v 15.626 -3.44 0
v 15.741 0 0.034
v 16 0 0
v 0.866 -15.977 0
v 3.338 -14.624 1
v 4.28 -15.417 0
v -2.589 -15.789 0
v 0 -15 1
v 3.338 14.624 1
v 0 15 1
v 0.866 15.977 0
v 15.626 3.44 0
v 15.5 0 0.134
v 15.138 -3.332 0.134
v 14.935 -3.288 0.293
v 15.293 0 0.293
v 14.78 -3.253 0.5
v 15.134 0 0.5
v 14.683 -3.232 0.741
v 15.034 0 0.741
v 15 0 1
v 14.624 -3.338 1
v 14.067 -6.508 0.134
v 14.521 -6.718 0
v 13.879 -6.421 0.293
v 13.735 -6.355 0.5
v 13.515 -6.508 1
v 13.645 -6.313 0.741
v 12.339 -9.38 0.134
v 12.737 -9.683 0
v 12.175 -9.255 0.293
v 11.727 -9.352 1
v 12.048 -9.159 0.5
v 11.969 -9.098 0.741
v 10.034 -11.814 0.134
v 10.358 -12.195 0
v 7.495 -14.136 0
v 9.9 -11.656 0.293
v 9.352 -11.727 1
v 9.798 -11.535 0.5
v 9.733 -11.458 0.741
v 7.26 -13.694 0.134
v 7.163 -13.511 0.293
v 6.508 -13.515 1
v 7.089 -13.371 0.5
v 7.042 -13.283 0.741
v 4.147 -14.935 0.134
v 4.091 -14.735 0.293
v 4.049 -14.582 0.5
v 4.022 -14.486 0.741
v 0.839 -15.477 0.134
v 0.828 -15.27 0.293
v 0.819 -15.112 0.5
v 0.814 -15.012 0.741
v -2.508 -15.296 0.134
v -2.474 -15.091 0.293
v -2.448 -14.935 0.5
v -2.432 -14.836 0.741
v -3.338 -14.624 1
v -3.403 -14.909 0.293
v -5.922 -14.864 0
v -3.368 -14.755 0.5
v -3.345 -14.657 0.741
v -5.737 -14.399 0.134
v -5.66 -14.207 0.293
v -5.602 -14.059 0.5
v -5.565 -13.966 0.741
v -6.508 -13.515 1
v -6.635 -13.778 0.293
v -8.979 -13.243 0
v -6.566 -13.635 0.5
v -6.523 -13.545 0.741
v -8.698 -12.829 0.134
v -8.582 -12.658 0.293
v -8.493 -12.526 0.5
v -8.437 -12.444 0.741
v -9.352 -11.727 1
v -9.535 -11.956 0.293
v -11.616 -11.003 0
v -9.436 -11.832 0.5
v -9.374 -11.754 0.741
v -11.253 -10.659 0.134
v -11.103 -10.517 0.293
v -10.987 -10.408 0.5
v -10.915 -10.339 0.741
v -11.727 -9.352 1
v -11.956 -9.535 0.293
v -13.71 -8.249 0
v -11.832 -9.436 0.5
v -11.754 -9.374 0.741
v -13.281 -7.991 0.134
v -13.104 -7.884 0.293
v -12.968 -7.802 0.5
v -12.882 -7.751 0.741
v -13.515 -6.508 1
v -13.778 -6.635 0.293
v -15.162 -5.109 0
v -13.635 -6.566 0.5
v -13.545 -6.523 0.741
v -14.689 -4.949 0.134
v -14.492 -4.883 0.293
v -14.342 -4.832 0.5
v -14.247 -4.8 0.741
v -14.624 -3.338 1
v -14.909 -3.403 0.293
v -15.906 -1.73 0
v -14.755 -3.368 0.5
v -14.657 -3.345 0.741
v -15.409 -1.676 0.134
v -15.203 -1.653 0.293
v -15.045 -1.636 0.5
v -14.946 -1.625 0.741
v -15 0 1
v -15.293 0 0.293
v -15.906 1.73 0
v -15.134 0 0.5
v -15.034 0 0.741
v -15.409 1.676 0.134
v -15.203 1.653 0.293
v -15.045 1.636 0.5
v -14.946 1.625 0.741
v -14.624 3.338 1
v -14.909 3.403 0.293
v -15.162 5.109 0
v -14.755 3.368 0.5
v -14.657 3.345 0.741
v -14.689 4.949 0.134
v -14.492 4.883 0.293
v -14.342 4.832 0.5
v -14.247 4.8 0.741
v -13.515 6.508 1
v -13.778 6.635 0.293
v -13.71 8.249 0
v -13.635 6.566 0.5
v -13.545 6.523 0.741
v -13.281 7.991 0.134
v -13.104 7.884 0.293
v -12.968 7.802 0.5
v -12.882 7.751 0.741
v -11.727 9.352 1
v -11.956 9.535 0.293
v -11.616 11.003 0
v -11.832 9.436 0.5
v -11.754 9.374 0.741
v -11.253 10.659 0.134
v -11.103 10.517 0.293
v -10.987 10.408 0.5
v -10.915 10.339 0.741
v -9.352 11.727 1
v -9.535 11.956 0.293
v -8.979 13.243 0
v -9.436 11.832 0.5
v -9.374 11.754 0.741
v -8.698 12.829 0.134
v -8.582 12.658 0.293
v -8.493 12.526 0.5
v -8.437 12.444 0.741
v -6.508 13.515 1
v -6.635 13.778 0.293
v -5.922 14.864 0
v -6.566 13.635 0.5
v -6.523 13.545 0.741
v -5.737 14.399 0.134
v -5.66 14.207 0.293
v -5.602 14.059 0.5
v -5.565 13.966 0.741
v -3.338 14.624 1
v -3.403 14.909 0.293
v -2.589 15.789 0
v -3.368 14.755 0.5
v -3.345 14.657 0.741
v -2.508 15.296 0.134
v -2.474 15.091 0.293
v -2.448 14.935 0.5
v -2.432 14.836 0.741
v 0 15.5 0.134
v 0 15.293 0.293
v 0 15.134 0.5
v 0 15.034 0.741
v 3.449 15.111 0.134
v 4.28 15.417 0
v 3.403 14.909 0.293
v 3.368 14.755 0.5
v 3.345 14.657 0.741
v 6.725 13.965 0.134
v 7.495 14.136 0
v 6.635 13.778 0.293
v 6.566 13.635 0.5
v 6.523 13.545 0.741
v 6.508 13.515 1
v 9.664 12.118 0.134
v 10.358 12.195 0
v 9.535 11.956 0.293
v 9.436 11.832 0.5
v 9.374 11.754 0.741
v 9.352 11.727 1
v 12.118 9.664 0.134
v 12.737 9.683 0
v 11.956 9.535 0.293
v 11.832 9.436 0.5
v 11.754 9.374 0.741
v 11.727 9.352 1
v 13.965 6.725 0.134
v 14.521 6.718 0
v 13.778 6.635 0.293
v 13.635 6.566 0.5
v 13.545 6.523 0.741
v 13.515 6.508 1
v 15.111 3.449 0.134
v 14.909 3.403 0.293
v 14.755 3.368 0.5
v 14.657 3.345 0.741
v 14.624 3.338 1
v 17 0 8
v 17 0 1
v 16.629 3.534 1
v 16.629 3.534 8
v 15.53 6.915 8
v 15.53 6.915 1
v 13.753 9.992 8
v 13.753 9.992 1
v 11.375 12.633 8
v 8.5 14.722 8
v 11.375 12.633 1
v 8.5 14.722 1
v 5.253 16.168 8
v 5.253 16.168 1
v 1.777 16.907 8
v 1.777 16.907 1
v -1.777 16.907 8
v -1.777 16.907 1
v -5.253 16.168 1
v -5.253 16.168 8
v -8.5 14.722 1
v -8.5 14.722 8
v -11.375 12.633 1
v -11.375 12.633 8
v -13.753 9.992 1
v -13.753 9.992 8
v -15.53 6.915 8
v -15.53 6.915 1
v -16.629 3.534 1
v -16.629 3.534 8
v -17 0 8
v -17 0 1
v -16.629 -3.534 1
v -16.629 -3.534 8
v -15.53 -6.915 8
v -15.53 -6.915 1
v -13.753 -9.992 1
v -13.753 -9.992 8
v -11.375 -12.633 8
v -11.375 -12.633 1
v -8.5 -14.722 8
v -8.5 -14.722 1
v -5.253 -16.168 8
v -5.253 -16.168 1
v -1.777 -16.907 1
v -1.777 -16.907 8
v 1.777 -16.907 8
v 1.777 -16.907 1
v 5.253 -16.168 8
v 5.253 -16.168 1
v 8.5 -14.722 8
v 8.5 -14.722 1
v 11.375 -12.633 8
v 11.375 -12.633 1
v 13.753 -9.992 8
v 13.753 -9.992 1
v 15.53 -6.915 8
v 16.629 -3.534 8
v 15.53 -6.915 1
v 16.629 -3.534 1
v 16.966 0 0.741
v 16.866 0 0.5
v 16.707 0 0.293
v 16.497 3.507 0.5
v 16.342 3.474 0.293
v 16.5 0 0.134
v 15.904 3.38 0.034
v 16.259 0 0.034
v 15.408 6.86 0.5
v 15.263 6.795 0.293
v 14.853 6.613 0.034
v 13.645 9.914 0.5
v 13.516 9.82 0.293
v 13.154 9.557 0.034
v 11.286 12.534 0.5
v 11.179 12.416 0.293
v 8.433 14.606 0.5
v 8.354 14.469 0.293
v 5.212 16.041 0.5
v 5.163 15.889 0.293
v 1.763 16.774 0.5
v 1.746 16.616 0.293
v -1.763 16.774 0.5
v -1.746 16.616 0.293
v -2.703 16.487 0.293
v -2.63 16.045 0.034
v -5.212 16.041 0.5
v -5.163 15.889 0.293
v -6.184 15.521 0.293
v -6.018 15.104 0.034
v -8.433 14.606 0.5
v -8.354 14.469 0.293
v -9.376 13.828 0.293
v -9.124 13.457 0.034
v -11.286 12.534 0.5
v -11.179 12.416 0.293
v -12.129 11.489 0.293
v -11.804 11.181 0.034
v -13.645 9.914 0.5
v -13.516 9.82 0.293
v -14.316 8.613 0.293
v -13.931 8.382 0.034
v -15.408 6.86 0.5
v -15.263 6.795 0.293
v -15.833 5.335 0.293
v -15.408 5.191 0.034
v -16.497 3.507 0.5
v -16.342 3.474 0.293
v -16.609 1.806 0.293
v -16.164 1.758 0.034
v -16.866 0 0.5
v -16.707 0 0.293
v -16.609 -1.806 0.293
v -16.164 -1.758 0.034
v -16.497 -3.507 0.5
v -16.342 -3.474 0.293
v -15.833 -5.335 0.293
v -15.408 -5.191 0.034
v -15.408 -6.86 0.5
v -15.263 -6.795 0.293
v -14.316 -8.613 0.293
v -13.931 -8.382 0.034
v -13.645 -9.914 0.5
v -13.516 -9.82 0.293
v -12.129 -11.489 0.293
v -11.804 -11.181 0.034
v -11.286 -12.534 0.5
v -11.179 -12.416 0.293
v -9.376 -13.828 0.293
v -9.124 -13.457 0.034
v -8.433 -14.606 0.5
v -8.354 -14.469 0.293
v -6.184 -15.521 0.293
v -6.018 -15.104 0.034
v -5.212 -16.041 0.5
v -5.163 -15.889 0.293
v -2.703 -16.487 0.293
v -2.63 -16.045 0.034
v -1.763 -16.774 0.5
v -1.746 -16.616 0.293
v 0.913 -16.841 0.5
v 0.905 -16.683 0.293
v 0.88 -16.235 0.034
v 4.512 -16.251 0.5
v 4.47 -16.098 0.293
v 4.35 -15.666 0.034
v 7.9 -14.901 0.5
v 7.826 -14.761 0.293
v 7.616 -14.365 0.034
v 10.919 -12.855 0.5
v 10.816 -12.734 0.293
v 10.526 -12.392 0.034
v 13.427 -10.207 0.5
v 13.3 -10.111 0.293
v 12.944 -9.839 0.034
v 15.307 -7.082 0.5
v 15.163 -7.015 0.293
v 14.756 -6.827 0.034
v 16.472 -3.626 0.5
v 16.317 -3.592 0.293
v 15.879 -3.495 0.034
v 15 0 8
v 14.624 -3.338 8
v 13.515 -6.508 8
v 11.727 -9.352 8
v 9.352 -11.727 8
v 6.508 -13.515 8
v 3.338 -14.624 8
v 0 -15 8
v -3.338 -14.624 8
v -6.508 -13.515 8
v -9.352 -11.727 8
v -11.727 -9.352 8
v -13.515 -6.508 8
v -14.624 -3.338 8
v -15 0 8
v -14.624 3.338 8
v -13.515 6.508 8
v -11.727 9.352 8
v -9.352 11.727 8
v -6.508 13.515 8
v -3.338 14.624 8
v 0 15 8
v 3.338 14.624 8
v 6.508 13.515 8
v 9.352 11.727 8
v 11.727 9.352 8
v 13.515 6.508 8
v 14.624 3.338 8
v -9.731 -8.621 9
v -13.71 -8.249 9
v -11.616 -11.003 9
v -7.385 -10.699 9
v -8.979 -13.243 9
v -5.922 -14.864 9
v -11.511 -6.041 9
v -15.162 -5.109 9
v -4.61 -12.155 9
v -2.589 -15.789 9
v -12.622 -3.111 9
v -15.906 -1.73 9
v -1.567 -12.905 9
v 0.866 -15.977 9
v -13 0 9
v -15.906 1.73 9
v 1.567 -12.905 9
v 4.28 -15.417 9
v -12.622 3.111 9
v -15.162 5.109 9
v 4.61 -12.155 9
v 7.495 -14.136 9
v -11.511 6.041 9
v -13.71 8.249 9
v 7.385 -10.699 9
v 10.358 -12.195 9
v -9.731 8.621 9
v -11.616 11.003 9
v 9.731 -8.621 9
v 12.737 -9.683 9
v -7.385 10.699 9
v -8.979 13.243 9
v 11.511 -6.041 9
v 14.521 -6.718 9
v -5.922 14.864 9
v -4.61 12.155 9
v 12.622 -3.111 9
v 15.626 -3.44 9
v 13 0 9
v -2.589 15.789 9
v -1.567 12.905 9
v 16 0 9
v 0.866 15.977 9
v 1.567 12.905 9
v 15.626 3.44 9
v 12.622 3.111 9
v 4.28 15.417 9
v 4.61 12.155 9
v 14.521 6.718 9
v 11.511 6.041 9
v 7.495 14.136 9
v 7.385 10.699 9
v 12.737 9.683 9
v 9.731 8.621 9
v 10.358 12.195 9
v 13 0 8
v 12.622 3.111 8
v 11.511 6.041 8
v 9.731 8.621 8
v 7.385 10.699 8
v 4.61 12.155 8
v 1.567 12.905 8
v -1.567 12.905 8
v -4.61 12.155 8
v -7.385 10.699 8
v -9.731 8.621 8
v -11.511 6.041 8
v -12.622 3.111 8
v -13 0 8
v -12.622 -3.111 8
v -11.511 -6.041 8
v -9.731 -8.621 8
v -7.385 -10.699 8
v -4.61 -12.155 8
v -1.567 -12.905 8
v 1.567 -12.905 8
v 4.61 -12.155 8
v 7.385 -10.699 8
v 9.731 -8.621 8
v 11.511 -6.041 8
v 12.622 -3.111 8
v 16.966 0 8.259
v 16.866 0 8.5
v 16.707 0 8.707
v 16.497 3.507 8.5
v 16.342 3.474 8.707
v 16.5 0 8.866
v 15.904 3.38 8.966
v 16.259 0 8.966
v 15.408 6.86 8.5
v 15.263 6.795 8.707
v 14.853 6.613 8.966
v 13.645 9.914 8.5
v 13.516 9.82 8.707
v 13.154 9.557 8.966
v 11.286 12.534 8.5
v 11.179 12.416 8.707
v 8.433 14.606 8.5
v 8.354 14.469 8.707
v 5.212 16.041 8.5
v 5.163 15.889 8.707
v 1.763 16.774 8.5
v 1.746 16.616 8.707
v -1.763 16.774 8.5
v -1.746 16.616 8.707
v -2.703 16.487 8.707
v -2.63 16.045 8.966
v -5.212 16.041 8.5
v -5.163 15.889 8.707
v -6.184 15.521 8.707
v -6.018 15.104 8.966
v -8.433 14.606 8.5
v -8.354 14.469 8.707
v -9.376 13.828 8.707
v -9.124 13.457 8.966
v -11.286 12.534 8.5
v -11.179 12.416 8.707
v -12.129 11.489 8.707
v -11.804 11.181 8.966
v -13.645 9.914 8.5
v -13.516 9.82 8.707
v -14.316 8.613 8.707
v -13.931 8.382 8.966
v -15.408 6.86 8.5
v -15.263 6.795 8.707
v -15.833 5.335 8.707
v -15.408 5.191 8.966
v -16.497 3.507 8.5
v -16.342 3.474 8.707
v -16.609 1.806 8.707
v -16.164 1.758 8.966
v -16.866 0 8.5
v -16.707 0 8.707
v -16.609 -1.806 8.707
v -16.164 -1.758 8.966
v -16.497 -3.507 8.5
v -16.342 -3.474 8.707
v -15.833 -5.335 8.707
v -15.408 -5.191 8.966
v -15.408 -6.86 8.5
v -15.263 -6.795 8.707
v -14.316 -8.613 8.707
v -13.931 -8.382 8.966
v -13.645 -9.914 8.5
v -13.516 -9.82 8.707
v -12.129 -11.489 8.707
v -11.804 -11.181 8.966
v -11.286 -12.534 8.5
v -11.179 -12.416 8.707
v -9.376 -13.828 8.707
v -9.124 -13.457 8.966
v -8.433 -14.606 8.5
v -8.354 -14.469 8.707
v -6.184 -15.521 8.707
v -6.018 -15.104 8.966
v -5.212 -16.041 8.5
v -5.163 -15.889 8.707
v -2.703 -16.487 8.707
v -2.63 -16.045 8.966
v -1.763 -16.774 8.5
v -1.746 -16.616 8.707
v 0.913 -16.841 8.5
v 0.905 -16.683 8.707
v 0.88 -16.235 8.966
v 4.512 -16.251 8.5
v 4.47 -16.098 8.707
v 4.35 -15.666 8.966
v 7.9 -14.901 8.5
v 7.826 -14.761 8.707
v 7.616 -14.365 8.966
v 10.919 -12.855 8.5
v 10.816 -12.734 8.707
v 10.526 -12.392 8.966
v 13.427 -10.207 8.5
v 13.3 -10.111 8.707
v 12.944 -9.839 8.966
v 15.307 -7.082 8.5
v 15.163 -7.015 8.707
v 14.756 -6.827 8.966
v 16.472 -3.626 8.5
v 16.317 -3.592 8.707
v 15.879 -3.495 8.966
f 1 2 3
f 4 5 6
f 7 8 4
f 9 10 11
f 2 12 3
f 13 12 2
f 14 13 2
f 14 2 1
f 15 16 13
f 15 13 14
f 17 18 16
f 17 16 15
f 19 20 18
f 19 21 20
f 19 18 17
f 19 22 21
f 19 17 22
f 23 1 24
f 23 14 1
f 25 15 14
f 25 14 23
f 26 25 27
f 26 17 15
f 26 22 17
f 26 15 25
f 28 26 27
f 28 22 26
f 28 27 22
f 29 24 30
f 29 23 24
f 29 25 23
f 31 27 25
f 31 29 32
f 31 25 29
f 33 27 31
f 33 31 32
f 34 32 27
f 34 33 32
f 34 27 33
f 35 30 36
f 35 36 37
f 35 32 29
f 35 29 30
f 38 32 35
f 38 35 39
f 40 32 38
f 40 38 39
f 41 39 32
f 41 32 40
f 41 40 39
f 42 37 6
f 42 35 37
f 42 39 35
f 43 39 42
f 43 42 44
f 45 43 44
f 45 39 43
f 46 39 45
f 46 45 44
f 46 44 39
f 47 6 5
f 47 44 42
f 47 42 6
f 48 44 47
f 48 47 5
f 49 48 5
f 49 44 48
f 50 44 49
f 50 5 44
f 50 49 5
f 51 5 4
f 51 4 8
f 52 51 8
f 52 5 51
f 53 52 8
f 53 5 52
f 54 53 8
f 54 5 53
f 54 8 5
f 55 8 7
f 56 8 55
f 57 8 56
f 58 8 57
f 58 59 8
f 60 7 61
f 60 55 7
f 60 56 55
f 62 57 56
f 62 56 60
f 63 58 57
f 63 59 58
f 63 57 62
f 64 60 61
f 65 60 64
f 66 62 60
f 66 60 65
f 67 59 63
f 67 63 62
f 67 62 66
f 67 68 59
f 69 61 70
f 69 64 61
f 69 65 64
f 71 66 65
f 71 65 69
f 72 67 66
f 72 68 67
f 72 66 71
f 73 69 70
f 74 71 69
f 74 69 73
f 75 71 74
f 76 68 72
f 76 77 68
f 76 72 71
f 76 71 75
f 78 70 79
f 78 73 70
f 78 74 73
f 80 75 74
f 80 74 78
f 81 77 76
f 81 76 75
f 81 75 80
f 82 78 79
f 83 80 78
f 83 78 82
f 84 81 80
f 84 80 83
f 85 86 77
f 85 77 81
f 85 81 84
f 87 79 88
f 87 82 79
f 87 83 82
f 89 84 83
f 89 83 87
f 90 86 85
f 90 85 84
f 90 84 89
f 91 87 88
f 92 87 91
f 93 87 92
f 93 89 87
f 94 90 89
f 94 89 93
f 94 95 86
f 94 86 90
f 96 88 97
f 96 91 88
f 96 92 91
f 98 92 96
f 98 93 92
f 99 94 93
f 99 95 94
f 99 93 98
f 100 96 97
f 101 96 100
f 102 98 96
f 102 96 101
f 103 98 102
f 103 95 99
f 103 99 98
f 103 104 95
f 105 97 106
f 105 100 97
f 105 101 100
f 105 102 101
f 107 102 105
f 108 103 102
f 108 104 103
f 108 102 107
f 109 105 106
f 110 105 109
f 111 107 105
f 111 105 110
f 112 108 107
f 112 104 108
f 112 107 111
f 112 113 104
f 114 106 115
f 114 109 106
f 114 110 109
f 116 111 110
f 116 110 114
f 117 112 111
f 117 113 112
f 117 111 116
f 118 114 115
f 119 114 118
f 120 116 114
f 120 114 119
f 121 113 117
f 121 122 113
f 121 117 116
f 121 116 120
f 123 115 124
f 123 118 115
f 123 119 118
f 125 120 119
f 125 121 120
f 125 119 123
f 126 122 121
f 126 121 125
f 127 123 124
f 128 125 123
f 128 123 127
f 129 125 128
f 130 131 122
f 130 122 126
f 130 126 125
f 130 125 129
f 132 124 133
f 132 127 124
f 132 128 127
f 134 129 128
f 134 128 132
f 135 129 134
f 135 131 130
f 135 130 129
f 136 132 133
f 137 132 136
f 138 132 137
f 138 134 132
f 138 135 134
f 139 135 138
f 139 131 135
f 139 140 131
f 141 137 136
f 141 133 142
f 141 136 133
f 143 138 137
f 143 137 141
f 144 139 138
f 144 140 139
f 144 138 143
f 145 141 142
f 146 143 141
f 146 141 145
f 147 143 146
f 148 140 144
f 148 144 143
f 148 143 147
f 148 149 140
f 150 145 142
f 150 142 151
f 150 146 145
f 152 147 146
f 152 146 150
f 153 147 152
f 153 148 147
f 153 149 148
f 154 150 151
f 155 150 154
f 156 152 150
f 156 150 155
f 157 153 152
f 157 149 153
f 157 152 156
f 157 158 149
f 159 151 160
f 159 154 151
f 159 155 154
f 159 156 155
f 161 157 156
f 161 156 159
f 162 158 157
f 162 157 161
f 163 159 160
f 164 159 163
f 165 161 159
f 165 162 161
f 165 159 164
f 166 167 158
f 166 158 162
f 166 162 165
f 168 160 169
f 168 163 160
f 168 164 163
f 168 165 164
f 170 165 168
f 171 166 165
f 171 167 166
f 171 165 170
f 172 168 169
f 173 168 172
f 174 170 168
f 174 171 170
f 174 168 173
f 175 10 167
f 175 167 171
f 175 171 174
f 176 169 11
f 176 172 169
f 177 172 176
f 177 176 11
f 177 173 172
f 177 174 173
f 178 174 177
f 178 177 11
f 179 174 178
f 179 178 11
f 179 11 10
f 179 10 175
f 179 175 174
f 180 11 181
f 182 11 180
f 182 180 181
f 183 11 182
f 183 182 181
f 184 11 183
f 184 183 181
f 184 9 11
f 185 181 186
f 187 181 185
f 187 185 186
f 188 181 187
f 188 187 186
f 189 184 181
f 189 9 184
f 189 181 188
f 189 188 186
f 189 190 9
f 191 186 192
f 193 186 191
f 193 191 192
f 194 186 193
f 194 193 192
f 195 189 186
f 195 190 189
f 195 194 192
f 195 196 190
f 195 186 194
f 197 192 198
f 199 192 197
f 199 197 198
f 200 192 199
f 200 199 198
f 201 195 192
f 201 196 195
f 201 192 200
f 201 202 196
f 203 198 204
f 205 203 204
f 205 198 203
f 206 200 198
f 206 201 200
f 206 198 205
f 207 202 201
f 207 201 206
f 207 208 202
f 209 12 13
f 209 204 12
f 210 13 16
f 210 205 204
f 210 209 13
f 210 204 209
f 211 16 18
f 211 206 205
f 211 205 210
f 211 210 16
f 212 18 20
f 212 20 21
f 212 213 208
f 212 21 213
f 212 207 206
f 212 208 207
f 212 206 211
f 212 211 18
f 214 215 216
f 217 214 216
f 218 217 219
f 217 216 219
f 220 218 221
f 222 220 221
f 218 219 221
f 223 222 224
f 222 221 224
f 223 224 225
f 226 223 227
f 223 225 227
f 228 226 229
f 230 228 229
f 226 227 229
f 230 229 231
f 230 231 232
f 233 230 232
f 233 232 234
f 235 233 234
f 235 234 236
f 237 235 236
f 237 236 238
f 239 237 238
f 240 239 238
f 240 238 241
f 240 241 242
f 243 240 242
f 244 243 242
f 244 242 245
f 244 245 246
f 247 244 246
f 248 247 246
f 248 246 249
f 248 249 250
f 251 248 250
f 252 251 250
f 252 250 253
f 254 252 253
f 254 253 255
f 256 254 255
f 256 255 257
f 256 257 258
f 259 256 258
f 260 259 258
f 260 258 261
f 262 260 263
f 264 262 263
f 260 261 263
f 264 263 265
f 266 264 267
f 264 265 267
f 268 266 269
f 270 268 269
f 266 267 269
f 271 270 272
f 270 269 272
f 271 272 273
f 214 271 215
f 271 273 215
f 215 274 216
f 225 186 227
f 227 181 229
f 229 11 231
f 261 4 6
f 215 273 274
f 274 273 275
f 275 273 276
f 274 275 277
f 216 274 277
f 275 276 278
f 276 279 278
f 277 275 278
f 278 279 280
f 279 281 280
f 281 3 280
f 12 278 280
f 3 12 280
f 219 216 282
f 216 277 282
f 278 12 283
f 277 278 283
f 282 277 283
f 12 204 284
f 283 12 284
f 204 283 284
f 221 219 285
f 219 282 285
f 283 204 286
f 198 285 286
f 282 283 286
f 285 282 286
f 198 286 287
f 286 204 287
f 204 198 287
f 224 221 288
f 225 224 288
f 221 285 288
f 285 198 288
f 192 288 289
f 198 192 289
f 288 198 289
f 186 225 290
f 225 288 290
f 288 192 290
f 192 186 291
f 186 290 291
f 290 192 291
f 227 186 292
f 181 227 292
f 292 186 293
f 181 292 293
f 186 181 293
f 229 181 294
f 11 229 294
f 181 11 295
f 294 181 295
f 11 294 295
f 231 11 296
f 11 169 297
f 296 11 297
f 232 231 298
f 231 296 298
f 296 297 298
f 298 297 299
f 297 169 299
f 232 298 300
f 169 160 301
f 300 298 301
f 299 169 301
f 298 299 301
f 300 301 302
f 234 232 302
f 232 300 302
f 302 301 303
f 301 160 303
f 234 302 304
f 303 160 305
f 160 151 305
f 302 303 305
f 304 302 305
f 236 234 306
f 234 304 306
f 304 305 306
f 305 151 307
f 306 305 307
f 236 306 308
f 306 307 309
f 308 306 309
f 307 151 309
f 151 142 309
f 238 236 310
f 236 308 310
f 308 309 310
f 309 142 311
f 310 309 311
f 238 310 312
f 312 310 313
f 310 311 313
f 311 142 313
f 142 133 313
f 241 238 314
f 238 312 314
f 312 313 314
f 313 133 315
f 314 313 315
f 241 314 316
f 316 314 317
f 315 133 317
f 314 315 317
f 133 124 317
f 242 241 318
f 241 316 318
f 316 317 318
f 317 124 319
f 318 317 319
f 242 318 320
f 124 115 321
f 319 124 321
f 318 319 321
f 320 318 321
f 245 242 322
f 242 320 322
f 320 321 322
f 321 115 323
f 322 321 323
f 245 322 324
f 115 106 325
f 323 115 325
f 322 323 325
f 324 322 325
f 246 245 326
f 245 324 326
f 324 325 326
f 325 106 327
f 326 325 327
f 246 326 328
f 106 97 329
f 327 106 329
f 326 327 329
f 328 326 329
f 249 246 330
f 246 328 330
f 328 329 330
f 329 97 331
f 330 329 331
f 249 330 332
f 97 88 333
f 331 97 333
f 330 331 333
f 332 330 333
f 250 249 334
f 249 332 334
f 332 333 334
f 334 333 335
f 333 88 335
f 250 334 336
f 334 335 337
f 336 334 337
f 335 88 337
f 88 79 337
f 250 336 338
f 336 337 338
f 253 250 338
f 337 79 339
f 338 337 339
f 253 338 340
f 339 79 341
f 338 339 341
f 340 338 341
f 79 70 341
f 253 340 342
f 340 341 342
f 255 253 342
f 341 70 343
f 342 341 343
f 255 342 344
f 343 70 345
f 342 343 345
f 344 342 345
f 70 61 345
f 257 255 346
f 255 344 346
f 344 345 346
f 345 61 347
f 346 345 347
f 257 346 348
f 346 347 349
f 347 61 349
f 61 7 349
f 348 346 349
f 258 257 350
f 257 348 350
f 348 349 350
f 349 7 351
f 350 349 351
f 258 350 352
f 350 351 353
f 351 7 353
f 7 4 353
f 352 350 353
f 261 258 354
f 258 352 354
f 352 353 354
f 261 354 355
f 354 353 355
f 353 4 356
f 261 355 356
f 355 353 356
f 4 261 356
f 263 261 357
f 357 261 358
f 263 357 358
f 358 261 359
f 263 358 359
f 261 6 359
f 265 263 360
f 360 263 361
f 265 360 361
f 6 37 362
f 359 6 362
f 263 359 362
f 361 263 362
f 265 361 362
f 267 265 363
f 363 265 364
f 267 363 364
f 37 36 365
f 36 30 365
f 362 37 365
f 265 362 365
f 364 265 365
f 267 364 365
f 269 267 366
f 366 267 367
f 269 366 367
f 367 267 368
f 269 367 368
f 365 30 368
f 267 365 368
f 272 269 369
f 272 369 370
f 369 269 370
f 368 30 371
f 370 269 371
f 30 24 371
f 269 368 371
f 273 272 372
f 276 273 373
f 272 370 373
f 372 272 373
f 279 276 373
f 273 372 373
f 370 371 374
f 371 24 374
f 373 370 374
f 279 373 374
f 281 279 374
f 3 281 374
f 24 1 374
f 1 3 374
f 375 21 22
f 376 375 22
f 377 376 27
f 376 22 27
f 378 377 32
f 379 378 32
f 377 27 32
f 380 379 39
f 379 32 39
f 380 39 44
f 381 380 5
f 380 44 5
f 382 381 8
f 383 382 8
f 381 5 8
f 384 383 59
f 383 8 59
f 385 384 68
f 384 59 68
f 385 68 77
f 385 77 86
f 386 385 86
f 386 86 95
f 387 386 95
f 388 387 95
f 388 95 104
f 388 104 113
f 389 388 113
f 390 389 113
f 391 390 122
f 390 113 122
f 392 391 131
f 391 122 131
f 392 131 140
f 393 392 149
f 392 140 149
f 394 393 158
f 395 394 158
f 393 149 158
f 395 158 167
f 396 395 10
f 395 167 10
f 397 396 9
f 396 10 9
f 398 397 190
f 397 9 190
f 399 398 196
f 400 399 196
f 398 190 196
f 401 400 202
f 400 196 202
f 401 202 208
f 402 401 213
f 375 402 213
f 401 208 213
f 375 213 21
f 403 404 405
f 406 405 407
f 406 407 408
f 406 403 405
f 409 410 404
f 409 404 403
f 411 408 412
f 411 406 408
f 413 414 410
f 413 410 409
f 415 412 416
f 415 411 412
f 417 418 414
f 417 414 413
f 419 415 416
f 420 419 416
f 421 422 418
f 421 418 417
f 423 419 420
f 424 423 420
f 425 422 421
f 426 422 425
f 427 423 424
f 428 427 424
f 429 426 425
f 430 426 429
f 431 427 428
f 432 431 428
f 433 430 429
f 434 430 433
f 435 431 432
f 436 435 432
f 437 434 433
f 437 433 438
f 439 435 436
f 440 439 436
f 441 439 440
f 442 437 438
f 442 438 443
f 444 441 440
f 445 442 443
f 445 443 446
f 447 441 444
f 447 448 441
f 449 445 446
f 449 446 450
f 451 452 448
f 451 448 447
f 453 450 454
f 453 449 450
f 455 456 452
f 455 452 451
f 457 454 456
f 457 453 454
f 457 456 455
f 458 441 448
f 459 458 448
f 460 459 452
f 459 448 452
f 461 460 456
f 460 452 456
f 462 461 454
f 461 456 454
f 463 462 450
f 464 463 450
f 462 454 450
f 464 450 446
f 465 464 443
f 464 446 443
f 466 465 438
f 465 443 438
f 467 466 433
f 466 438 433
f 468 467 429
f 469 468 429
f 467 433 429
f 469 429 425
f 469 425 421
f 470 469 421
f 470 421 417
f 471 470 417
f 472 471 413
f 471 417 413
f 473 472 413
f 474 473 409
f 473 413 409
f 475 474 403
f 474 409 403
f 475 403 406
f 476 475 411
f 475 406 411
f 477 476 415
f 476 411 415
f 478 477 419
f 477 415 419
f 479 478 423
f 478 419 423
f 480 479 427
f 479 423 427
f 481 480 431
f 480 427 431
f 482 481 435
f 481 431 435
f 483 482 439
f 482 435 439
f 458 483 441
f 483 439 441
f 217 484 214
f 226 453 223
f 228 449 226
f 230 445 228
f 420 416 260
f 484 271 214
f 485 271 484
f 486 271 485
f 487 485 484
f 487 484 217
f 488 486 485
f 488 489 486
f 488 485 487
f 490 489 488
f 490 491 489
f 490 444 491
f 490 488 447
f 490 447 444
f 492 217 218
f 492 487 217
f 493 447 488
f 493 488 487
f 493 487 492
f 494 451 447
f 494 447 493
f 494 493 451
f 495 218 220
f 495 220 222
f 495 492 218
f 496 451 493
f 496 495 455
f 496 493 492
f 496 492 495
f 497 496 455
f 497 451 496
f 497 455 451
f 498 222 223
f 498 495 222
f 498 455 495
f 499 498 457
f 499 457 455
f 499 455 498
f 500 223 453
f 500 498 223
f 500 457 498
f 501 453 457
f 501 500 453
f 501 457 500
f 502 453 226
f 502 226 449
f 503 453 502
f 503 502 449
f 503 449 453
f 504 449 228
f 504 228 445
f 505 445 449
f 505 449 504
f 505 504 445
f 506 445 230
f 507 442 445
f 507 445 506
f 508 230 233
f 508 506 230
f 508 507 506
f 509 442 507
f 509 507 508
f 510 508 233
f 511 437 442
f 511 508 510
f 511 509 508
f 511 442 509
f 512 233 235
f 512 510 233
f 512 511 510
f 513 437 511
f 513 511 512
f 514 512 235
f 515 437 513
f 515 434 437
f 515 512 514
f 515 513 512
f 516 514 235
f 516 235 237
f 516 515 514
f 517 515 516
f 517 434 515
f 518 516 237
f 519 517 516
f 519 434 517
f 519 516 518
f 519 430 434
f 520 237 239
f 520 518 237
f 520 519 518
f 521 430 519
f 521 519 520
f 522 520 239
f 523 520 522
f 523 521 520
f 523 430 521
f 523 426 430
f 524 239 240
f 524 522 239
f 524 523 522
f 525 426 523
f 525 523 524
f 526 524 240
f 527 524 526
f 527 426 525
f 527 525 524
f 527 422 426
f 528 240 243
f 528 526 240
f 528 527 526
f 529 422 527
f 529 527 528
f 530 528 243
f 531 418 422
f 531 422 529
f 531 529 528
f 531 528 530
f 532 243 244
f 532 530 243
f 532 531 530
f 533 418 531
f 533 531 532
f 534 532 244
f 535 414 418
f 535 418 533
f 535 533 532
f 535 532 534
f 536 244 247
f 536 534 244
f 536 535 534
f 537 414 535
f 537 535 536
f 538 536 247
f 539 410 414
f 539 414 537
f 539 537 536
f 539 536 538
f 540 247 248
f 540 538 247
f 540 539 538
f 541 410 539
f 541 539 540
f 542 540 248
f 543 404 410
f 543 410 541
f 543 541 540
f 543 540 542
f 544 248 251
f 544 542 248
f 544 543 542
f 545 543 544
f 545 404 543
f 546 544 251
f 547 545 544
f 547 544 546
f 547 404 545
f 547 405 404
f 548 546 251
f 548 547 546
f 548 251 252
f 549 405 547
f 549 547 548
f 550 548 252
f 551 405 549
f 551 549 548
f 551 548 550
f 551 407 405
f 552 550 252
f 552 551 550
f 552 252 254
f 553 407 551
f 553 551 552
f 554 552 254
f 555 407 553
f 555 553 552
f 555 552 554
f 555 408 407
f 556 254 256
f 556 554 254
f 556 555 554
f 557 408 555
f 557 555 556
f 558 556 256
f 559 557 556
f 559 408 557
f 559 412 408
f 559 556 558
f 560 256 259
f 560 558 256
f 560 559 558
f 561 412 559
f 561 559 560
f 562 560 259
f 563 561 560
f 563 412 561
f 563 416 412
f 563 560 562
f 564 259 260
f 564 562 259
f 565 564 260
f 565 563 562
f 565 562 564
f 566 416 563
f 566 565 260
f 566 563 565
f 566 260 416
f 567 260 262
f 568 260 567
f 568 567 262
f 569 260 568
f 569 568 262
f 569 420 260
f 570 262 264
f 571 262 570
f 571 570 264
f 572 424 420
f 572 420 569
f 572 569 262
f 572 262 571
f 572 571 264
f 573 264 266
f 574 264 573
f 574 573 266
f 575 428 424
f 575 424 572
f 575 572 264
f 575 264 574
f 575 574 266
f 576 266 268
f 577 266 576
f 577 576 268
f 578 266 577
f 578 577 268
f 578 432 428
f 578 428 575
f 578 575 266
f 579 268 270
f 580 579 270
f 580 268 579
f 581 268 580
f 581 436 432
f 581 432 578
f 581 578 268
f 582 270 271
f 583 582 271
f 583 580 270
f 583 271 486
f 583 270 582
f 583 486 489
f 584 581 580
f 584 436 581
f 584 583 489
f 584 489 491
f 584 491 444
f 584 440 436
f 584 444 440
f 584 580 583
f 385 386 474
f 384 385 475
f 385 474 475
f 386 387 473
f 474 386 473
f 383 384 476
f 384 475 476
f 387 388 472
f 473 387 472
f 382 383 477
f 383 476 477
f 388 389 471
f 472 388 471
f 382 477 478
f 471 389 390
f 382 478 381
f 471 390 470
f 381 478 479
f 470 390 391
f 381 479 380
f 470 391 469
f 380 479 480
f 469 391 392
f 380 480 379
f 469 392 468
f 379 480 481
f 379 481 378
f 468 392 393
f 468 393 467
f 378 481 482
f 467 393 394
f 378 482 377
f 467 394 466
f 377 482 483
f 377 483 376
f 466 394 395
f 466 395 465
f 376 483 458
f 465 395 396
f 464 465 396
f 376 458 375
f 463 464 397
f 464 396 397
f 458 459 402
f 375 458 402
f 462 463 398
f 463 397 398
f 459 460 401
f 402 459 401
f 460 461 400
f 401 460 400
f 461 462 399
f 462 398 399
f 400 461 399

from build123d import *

# Parameters (mm, degrees)
F0_R     = 17
F1_DEPTH = 8
F2_R     = 15
F3_DEPTH = 8
F4_R     = 17
F5_DEPTH = 1
F6_R     = 13
F7_DEPTH = 1
F8_R     = 0.99999
F9_R     = 1


# Not quite as in the source:
# - a fillet or chamfer is up to 0.001 mm smaller than in the source, because OpenCascade refuses the exact size


with BuildPart() as f1:
    # F0 (on Top) → F1 (new body)
    with BuildSketch(Plane.XY):
        Circle(F0_R)
    extrude(amount=F1_DEPTH)

    # F2 (on face) → F3 (cut)
    with BuildSketch(Plane(origin=(0, 0, 0), x_dir=(1, 0, 0), z_dir=(0, 0, -1))):
        Circle(F2_R)
    extrude(amount=-F3_DEPTH, mode=Mode.SUBTRACT)

    # F4 (on face) → F5 (join)
    with BuildSketch(Plane.XY.offset(8)):
        Circle(F4_R)
    extrude(amount=F5_DEPTH)

    # F6 (on face) → F7 (cut)
    with BuildSketch(Plane.XY.offset(9)):
        Circle(F6_R)
    extrude(amount=-F7_DEPTH, mode=Mode.SUBTRACT)

    # F8 (radius 1 in the source; OpenCascade refuses exactly that, so slightly less here)
    f8_edges = [f1.edges().sort_by_distance(p)[0] for p in [
        (-17, 0, 0),
        (-15, 0, 0),
    ]]
    fillet(f8_edges, radius=F8_R)

    # F9
    f9_edges = [f1.edges().sort_by_distance(p)[0] for p in [
        (-17, 0, 9),
    ]]
    fillet(f9_edges, radius=F9_R)


solid = f1.part
